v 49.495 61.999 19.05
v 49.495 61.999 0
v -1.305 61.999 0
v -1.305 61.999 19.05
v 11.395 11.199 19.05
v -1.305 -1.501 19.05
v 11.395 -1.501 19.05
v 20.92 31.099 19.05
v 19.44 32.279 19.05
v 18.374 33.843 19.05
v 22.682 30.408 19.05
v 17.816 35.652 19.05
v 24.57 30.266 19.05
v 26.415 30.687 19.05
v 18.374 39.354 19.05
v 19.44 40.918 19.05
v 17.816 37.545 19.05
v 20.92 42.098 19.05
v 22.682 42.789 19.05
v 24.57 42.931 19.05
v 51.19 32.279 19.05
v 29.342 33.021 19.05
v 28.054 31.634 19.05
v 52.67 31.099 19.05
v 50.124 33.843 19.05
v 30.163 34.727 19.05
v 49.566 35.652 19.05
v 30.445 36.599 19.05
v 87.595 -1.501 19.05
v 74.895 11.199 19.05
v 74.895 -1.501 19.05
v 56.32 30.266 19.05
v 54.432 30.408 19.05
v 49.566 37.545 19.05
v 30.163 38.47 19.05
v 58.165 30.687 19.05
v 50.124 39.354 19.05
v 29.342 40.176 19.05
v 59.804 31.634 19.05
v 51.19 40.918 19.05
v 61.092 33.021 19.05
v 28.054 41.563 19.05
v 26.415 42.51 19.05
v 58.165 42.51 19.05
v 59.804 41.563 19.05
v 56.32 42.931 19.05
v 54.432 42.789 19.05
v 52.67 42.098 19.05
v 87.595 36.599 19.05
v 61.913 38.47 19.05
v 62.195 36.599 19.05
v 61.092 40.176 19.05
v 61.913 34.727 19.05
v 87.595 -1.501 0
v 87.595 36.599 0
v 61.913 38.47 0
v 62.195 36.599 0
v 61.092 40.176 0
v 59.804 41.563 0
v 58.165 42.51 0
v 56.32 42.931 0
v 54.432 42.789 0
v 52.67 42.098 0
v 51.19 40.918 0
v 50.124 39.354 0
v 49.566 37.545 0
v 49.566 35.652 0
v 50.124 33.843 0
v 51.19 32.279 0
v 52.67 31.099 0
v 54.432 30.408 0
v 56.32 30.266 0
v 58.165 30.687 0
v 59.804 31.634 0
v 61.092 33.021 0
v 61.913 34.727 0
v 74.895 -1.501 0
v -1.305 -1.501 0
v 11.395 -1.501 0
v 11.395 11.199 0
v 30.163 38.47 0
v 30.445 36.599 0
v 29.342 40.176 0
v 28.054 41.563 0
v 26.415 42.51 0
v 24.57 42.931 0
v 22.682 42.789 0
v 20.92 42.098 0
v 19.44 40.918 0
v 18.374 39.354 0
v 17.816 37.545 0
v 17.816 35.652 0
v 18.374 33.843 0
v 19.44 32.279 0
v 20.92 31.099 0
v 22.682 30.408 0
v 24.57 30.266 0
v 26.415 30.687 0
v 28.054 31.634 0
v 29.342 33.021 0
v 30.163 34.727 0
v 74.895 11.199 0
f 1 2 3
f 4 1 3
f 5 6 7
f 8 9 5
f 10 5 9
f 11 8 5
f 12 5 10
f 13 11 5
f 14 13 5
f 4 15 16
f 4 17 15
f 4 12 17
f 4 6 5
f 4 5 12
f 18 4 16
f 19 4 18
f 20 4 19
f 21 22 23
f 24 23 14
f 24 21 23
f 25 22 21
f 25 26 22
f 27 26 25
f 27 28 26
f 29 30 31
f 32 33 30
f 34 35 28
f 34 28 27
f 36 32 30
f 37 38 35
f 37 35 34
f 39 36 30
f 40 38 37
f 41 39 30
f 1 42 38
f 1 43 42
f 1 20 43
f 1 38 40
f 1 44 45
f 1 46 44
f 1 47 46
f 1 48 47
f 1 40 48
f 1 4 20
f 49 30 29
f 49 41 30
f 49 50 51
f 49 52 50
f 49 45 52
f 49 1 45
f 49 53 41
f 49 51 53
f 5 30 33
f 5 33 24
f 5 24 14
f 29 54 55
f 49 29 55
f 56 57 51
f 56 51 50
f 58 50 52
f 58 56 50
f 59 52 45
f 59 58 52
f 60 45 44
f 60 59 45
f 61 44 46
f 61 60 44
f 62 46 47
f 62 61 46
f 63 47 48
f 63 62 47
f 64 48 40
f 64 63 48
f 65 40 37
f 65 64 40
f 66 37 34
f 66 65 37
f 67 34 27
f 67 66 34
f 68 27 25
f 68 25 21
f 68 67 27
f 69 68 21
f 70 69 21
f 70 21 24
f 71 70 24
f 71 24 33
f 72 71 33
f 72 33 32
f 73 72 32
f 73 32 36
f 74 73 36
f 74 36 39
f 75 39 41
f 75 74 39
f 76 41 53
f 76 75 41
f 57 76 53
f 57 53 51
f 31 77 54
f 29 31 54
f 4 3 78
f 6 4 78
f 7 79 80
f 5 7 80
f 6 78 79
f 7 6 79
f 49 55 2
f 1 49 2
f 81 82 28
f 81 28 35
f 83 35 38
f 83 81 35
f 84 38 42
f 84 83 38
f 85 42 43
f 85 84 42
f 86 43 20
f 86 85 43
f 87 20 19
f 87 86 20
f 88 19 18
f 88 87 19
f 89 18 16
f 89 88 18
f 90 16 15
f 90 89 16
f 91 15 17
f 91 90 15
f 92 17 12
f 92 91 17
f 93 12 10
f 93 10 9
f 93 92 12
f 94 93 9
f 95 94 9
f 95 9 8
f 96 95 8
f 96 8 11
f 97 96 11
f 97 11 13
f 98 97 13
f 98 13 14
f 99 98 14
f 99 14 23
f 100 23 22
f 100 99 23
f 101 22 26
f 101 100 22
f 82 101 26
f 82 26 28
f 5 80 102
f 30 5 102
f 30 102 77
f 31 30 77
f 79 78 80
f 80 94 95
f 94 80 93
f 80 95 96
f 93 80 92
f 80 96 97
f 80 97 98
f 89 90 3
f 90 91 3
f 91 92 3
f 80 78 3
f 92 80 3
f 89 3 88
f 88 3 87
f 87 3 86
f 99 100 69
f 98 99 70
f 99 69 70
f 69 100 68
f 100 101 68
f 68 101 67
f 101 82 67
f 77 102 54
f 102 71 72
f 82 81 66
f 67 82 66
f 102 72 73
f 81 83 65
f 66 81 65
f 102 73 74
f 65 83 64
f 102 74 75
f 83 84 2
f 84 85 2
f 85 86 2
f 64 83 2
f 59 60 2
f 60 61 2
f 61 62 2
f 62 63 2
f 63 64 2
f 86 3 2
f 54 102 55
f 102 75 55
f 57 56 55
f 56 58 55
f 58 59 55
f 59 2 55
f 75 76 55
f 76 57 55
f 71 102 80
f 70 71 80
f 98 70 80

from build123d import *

# Parameters (mm, degrees)
SKETCH1_R           = 6.35
BOSS_EXTRUDE1_DEPTH = 19.05


with BuildPart() as part:
    # Sketch1 → Boss-Extrude1 (new body)
    with BuildSketch(Plane.XY):
        Polygon((-1.304733728, 61.99852071), (-1.304733728, -1.50147929), (11.395266272, -1.50147929), (11.395266272, 11.19852071), (74.895266272, 11.19852071), (74.895266272, -1.50147929), (87.595266272, -1.50147929), (87.595266272, 36.59852071), (49.495266272, 61.99852071), align=None)
        with Locations((24.095266272, 36.59852071)):
            Circle(SKETCH1_R, mode=Mode.SUBTRACT)
        with Locations((55.845266272, 36.59852071)):
            Circle(SKETCH1_R, mode=Mode.SUBTRACT)
    extrude(amount=BOSS_EXTRUDE1_DEPTH)


solid = part.part
